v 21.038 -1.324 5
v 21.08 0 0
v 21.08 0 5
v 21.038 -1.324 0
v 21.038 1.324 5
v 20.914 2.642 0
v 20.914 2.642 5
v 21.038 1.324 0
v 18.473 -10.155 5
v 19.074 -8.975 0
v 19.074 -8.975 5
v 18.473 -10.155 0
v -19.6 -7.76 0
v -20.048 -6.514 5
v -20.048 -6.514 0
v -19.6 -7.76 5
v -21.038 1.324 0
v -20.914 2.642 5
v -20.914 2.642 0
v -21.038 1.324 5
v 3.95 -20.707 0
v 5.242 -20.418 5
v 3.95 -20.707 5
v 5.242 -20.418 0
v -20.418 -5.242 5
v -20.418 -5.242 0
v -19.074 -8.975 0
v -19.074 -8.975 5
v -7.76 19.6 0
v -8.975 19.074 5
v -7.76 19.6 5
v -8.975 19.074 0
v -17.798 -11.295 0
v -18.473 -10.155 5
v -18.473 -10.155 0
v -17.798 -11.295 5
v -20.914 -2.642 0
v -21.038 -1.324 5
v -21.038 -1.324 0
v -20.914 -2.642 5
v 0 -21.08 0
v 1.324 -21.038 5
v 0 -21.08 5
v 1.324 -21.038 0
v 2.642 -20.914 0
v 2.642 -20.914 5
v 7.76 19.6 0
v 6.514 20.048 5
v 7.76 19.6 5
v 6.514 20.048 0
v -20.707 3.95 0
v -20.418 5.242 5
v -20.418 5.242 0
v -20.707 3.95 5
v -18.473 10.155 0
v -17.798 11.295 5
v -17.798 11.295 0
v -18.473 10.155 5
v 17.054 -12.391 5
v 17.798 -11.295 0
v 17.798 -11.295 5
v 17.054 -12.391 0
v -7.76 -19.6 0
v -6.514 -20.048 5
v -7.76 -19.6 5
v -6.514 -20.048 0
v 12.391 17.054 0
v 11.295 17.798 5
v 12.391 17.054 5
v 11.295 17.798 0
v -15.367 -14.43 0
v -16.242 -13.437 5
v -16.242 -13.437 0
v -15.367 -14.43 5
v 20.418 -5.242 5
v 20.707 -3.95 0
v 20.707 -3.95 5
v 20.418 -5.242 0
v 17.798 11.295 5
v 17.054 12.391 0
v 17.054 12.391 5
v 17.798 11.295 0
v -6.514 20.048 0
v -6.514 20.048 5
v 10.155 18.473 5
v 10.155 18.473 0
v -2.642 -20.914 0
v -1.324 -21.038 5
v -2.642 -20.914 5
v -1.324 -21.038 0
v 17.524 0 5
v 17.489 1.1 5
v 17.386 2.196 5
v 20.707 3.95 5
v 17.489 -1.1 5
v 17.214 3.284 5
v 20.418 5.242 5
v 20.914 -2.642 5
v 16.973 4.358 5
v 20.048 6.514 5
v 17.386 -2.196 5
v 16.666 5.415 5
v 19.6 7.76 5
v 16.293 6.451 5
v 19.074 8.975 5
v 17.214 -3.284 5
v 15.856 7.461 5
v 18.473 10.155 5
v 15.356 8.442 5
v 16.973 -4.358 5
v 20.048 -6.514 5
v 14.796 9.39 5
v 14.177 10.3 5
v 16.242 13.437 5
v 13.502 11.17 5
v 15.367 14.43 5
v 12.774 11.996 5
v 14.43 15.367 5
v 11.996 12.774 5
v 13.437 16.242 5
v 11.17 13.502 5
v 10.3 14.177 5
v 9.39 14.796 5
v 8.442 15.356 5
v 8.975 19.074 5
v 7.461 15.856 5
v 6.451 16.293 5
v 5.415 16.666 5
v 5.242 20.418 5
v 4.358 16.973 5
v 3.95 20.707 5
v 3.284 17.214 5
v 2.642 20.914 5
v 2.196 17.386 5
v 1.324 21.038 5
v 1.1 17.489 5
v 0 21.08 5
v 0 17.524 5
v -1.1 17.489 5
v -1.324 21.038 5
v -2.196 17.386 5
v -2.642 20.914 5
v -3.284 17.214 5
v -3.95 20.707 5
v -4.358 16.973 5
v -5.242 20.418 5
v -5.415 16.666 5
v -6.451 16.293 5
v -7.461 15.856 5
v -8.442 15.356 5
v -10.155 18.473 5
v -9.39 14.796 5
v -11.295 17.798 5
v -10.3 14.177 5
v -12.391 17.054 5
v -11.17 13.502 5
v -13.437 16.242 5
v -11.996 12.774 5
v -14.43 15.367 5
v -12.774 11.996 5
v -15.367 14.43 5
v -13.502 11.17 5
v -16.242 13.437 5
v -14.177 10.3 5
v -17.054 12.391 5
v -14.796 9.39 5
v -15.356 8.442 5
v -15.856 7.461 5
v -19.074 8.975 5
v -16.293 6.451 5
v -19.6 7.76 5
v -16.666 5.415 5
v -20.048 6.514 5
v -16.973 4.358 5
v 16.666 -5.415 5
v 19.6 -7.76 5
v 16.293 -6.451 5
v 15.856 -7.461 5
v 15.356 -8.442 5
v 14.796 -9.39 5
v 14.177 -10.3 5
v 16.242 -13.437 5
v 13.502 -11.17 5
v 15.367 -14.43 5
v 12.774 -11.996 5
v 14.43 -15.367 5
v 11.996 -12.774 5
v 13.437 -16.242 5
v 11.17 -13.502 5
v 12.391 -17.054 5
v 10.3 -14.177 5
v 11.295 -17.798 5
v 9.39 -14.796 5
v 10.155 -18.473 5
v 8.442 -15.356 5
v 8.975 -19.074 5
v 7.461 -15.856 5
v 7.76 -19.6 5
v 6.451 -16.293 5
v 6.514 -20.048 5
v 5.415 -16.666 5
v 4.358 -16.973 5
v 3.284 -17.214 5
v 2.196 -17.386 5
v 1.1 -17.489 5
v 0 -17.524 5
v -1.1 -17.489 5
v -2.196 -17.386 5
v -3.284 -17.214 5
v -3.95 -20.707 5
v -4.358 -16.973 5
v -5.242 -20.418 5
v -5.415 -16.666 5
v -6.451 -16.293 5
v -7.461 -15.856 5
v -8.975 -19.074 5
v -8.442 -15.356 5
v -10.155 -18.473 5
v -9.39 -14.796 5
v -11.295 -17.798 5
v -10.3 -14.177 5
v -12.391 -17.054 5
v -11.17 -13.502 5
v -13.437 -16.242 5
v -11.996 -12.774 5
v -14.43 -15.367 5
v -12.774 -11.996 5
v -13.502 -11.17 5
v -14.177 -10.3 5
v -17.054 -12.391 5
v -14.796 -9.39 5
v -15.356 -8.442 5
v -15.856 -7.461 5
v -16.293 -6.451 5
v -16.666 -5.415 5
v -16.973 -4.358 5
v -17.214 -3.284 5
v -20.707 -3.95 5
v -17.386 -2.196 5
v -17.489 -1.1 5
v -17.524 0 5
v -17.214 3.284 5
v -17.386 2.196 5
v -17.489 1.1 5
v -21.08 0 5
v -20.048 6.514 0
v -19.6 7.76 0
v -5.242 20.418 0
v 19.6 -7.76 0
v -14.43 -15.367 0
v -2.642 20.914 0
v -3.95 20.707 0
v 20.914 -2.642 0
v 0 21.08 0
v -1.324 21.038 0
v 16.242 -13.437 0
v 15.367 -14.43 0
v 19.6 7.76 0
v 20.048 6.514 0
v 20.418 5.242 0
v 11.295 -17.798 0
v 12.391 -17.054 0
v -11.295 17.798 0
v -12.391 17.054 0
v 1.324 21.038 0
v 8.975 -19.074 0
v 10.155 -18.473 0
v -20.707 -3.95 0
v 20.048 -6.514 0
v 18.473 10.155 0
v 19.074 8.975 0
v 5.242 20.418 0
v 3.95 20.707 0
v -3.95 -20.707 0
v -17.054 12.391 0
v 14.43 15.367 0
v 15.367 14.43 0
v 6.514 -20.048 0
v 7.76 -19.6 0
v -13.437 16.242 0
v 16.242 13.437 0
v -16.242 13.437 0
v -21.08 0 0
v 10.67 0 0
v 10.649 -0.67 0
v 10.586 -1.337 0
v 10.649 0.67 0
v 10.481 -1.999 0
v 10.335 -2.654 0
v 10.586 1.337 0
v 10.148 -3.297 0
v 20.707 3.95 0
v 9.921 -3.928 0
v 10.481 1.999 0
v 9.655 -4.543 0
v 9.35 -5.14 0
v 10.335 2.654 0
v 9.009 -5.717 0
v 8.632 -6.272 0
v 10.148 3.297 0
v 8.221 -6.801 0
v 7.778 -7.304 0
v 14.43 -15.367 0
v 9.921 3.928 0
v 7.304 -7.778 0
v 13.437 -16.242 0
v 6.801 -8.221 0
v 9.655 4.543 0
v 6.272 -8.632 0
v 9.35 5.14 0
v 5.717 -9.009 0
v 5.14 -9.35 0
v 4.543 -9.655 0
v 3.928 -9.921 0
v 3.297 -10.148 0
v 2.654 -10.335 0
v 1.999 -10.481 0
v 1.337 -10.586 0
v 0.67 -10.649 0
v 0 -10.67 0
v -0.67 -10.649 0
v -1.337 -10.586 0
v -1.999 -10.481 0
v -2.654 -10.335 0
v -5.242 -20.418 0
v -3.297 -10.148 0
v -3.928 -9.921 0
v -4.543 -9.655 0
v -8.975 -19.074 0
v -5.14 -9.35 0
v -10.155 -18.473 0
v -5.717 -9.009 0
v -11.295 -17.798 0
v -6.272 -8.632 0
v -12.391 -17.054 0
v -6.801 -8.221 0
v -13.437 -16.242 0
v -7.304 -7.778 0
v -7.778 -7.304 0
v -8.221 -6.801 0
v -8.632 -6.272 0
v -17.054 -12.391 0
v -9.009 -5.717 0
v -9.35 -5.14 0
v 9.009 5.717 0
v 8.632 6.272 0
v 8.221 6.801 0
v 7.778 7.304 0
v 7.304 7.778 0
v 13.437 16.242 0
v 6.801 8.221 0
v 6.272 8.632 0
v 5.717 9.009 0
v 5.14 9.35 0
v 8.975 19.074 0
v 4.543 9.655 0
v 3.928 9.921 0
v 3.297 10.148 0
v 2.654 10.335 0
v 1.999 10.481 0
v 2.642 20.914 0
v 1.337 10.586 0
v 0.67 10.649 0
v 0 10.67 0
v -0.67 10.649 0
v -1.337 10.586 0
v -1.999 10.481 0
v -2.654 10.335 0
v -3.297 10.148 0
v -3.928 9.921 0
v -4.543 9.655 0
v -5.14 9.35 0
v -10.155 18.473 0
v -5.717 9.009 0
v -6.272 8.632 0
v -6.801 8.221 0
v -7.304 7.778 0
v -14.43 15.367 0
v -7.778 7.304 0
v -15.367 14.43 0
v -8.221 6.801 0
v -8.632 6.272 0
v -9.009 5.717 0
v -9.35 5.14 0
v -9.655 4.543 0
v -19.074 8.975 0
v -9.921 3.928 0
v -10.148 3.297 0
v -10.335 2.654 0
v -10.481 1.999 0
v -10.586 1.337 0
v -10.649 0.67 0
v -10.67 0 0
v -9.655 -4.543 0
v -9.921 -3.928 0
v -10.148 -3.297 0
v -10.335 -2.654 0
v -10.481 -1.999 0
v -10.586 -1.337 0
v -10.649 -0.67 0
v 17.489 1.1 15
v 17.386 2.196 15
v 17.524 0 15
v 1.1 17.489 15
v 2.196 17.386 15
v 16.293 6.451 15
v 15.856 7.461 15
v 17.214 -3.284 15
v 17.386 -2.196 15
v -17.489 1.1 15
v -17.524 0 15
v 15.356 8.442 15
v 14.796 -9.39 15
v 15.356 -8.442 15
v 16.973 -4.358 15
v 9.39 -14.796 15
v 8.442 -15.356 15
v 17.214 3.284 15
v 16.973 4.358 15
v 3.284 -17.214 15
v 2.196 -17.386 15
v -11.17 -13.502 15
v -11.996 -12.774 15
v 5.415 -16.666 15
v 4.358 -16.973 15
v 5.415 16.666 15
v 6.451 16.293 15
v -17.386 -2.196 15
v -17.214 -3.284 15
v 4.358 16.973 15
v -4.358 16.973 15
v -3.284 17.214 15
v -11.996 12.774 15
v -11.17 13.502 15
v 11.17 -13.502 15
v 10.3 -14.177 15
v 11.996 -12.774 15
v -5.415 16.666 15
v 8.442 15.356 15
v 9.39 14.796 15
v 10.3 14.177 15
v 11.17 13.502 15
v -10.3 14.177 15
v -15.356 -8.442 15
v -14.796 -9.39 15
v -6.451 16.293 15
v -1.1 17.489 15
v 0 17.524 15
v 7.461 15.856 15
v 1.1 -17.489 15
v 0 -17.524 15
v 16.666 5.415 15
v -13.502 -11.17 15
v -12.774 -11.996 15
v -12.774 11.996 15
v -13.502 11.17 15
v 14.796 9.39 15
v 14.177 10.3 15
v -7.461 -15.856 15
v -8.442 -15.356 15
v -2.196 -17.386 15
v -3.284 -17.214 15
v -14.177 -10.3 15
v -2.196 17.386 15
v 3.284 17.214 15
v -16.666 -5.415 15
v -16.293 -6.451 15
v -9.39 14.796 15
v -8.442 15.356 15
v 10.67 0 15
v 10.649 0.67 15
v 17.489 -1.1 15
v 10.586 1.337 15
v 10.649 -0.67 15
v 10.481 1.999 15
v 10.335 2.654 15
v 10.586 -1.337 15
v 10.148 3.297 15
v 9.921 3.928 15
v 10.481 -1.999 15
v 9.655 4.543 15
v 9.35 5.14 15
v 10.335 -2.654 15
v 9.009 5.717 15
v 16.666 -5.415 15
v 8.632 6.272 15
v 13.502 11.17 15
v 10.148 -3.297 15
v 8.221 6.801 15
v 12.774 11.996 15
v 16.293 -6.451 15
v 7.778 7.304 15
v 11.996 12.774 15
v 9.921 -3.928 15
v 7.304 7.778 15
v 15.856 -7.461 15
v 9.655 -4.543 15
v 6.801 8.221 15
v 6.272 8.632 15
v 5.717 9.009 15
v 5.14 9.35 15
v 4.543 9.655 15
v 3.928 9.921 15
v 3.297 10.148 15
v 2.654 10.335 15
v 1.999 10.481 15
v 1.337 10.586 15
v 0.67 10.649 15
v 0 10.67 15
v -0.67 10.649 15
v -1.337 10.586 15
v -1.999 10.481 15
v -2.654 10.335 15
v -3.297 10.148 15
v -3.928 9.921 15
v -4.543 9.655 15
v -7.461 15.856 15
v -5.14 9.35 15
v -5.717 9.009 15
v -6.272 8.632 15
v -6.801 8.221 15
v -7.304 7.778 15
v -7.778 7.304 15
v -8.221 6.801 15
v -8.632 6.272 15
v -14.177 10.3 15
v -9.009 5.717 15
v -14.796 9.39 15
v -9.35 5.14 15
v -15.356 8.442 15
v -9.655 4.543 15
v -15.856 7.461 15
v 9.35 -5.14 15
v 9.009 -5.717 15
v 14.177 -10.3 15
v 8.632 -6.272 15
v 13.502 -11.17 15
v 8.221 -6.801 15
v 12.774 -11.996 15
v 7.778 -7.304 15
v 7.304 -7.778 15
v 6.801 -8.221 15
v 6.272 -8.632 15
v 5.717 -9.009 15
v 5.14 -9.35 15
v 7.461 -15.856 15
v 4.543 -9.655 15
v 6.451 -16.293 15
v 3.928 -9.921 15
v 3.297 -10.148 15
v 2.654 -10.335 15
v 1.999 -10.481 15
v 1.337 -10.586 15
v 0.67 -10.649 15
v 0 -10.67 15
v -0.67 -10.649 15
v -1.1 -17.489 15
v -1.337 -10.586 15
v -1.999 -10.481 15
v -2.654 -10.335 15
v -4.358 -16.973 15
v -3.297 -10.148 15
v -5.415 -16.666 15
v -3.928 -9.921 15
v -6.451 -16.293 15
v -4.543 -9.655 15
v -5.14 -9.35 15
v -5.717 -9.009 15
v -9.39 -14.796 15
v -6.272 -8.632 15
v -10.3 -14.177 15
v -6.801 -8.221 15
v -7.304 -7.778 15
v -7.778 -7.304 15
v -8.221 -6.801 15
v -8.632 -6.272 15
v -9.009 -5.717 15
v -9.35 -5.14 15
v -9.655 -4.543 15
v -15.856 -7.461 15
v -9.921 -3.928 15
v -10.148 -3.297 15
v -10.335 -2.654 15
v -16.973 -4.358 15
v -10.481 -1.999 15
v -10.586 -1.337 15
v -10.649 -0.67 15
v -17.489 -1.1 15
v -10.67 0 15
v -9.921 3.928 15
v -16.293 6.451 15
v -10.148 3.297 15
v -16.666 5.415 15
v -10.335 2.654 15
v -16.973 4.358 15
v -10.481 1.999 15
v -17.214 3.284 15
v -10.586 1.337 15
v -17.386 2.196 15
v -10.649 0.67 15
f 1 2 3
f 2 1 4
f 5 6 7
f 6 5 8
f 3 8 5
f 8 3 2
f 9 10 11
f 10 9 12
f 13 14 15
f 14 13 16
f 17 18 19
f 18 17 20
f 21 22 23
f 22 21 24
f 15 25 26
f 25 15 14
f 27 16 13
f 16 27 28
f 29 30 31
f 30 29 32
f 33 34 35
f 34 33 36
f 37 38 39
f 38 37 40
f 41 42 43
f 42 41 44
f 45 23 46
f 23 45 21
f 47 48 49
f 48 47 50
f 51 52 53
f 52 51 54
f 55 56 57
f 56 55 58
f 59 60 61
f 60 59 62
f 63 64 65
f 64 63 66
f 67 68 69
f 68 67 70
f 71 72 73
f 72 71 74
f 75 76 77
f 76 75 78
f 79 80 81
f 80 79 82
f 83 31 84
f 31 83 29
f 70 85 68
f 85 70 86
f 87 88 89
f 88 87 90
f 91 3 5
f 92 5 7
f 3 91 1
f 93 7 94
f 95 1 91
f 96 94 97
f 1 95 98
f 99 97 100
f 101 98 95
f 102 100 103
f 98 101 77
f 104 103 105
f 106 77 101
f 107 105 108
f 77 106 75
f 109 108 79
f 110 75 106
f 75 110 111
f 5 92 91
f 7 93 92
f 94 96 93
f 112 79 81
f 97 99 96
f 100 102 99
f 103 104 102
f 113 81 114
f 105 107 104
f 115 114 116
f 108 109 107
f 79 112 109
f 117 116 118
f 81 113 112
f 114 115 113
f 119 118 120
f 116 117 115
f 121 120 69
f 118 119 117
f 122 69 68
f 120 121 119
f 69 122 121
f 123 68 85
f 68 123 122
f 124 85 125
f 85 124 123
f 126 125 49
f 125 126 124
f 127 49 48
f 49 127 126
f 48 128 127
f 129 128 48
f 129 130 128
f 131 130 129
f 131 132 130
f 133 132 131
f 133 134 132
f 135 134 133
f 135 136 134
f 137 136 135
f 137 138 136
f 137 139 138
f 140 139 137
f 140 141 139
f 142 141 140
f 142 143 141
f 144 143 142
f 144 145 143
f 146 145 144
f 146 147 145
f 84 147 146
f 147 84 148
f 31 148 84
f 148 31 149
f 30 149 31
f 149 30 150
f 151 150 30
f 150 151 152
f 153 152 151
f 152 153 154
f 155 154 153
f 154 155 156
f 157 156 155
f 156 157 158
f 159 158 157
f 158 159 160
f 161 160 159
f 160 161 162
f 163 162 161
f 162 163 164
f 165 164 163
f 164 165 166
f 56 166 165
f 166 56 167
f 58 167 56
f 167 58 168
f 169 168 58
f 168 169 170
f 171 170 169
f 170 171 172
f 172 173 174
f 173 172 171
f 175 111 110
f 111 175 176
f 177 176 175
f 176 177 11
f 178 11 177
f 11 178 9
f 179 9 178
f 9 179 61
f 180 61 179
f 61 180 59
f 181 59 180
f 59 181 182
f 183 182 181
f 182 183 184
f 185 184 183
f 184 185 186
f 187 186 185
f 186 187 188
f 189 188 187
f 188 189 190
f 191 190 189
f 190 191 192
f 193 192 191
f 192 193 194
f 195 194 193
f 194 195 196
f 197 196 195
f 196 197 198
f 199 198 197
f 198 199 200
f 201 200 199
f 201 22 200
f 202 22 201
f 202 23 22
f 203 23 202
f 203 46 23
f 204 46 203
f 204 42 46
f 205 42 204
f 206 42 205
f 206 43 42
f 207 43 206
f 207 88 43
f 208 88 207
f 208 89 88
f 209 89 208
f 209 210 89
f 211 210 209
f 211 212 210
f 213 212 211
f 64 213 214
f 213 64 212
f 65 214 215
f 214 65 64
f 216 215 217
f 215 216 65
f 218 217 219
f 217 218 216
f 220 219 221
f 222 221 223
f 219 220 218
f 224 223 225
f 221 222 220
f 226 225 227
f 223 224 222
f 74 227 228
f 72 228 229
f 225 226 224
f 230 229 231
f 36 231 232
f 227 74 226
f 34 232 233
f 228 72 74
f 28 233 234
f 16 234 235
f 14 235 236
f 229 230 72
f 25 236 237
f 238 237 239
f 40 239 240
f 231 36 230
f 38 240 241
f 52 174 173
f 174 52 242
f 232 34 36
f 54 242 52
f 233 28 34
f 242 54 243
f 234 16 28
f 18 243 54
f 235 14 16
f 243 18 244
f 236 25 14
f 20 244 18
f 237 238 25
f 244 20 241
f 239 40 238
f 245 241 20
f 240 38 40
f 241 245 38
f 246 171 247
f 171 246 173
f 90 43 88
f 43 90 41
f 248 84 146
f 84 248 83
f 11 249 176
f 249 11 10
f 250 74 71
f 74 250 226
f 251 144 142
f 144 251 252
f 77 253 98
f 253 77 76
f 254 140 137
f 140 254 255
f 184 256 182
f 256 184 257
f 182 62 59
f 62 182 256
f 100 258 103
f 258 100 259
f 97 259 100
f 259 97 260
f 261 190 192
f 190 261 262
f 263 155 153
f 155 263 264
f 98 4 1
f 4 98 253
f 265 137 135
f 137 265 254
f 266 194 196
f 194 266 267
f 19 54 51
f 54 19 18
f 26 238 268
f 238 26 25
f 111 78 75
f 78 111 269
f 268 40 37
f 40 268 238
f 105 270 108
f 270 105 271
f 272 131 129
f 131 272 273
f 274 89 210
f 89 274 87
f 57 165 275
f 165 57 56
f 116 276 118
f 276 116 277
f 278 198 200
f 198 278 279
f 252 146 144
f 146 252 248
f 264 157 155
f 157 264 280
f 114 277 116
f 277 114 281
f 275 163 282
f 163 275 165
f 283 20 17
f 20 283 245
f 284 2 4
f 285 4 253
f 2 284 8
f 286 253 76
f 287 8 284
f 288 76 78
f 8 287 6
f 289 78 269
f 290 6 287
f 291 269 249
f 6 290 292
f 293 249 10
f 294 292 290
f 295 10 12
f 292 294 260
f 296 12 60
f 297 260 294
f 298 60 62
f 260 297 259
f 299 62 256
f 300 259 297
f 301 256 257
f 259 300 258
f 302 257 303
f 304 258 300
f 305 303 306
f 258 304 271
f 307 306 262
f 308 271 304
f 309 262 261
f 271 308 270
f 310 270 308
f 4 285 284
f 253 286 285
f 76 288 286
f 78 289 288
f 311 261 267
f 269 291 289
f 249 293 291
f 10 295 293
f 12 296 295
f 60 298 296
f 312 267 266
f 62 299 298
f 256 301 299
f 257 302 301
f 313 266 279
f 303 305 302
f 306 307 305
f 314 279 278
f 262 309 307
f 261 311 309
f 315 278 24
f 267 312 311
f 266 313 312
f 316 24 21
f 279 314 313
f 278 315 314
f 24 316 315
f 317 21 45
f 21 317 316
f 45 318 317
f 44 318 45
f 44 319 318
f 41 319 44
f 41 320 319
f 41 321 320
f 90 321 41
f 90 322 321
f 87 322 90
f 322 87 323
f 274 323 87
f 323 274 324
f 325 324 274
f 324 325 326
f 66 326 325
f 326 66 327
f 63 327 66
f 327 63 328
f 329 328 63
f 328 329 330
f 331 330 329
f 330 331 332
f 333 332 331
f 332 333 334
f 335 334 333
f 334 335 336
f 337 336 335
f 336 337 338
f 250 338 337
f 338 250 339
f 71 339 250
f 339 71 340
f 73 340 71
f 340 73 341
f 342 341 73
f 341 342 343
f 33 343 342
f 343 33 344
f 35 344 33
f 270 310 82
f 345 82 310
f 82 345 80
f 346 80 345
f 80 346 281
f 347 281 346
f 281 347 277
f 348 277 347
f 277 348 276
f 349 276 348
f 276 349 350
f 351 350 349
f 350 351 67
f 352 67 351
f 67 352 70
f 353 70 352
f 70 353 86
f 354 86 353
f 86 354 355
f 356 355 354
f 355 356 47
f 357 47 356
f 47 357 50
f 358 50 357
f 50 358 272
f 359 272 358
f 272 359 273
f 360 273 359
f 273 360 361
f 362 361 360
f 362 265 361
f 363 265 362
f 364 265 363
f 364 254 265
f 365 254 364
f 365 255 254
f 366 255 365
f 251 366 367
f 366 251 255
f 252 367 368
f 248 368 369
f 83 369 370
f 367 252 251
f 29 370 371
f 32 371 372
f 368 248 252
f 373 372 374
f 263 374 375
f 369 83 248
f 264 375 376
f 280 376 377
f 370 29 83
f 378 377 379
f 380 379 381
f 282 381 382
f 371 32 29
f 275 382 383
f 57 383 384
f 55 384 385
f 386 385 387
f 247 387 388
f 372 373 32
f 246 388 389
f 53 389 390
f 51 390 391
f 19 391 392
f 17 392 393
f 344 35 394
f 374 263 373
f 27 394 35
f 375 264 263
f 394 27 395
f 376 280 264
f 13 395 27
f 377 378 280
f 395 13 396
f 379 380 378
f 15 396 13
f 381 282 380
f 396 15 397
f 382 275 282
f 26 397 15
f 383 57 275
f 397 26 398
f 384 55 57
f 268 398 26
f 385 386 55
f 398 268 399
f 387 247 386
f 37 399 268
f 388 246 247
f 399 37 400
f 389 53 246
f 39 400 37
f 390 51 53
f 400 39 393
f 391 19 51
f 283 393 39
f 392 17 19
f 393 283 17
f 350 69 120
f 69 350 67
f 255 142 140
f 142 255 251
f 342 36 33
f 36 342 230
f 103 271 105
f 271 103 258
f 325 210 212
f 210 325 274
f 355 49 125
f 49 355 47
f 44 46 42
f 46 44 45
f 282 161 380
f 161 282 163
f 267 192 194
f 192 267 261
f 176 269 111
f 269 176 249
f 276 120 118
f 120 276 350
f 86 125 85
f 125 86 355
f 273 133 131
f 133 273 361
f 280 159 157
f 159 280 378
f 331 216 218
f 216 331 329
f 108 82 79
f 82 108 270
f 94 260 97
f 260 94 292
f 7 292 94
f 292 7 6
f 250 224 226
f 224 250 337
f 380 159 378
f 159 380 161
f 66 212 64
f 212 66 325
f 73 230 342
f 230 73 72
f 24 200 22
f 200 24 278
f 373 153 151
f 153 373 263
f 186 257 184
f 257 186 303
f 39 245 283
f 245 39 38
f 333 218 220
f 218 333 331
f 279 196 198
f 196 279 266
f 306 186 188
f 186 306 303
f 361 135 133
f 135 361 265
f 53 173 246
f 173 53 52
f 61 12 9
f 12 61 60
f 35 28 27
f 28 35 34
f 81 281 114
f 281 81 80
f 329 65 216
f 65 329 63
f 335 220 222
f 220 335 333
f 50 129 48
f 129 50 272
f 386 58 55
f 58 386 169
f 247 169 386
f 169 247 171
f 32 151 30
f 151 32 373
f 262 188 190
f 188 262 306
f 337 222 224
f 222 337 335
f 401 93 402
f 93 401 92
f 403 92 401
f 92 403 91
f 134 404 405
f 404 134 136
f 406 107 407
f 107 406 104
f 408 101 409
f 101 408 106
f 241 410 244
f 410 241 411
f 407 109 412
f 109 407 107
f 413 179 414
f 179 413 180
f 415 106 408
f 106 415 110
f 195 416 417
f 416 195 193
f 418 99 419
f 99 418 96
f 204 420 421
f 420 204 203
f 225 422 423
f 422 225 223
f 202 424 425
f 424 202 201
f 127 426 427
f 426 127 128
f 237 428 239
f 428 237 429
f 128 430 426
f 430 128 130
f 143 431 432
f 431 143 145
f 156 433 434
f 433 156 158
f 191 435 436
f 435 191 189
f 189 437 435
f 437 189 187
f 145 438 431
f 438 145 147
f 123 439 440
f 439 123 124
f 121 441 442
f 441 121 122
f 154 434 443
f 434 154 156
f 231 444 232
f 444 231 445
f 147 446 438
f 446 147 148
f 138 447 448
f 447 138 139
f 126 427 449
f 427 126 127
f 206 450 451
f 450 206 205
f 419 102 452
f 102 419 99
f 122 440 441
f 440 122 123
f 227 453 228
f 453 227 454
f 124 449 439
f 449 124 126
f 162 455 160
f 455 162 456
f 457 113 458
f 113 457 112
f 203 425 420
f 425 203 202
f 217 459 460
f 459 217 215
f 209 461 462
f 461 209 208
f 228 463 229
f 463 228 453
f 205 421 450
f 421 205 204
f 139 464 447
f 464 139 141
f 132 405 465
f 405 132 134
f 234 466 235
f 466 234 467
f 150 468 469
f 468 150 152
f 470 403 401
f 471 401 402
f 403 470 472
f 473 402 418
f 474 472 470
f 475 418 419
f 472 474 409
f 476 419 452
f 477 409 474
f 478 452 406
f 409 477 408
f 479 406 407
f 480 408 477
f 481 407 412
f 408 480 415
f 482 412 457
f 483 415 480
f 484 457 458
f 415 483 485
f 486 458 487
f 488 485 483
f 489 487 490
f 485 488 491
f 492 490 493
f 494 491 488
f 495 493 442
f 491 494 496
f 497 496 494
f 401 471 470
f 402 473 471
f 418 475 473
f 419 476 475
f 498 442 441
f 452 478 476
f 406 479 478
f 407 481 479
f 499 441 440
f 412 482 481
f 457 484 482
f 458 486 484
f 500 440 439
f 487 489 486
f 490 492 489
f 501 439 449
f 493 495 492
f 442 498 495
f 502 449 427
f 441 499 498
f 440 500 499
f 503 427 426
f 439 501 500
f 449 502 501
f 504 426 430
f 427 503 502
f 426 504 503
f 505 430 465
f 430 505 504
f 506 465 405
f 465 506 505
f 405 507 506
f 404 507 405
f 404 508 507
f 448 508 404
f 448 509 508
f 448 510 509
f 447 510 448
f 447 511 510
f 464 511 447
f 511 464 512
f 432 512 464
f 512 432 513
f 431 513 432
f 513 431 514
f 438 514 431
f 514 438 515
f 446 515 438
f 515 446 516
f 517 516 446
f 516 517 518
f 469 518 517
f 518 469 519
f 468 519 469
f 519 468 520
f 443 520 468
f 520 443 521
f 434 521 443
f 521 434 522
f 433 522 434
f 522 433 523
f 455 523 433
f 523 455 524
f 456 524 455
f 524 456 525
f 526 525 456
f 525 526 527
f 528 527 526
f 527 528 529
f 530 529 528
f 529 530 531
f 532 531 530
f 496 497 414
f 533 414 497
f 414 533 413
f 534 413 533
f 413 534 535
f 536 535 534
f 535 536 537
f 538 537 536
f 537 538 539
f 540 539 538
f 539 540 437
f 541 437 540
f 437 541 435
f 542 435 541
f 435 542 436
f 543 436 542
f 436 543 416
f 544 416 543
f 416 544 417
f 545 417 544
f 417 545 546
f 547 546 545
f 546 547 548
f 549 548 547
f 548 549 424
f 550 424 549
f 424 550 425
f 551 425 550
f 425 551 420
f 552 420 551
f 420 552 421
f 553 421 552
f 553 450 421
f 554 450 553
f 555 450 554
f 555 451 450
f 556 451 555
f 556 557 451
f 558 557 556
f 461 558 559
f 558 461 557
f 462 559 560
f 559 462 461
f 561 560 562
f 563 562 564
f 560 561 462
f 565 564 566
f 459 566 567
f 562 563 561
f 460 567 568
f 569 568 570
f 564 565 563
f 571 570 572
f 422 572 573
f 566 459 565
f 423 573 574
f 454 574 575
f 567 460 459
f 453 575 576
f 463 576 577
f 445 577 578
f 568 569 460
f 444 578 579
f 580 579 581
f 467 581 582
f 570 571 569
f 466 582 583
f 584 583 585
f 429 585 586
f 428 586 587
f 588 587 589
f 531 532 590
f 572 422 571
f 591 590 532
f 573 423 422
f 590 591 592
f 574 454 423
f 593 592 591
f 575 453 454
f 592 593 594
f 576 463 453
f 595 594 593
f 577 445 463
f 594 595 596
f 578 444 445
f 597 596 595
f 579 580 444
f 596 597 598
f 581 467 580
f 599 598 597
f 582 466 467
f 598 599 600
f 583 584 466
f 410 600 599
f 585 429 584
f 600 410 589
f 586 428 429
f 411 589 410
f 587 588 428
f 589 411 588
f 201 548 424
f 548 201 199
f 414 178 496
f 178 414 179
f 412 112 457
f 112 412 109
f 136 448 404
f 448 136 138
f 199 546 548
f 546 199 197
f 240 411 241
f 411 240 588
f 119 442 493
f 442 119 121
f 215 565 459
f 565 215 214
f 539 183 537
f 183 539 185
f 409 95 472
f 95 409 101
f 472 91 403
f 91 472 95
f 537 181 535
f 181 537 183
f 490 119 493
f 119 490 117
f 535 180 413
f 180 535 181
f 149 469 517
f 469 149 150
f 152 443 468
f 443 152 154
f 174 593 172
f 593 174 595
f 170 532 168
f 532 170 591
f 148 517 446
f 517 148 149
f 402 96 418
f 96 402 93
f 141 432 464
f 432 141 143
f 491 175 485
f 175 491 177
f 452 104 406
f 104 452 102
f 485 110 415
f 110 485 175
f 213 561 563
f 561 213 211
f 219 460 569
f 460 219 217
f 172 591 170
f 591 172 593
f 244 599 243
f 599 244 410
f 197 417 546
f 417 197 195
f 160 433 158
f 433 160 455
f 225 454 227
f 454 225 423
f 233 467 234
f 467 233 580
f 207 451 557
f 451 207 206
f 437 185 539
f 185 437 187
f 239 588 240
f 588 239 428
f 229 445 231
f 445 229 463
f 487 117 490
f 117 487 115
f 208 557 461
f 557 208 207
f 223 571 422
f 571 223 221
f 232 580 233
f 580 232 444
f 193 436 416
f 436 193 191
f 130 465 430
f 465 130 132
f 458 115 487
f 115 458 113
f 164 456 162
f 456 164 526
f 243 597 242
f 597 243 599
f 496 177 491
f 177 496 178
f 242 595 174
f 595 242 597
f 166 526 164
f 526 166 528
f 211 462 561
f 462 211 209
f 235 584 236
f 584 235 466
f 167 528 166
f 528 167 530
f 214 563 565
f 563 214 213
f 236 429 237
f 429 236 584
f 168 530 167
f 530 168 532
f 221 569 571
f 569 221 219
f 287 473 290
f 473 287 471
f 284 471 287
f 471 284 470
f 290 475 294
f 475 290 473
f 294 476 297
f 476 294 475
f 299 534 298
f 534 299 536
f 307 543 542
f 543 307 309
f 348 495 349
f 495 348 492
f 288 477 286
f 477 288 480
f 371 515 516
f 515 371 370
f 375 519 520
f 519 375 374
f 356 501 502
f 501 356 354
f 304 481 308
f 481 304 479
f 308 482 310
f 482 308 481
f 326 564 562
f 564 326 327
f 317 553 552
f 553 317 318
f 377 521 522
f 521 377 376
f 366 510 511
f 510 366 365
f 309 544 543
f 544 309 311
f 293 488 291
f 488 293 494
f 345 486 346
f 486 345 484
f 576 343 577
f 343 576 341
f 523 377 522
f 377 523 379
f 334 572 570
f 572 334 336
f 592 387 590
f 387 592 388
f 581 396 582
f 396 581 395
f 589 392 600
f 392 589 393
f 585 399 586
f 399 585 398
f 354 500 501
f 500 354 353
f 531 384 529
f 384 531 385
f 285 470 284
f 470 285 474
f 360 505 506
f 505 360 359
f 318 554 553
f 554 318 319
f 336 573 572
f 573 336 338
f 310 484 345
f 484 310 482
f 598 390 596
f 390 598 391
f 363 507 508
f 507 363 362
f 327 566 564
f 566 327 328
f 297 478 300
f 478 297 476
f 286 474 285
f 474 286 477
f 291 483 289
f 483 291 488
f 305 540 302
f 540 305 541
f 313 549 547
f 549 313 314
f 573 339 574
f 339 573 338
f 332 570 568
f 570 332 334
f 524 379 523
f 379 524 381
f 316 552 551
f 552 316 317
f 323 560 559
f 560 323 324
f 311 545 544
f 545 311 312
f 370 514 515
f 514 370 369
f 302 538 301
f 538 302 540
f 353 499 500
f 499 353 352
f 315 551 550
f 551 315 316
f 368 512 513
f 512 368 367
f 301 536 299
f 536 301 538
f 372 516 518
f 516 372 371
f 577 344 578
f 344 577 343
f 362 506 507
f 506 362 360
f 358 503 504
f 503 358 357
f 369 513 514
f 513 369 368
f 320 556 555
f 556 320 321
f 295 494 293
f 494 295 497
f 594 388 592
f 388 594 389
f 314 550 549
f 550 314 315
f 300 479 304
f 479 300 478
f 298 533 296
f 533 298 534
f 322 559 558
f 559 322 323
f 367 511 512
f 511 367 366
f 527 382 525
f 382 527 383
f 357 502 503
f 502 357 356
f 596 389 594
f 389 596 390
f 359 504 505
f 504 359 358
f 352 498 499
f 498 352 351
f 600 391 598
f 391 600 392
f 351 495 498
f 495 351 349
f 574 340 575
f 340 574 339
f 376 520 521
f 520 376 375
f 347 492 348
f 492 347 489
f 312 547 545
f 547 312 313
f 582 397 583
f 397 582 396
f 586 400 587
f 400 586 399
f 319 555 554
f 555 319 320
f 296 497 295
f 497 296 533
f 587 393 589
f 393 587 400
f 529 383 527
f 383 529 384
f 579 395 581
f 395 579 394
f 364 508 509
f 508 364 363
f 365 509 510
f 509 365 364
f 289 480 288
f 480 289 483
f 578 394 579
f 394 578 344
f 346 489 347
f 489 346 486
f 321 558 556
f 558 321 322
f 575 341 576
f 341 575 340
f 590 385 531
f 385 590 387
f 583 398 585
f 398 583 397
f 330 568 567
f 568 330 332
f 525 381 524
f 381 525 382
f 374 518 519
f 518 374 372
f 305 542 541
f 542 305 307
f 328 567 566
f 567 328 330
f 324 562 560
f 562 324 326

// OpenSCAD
$fn = 100;

tubeOD = 42.16;
tubeWall = 3.556;
tubeID = tubeOD - 2 * tubeWall;
barrelOD = 21.34;
lipH = 5;
insertH = 10;

difference () {
    union () {
        cylinder(r=tubeOD/2, h=lipH);
        translate([0,0,lipH]) cylinder(r=tubeID/2, h=insertH);
    }
    cylinder(r=barrelOD/2, h=lipH+insertH);
}
